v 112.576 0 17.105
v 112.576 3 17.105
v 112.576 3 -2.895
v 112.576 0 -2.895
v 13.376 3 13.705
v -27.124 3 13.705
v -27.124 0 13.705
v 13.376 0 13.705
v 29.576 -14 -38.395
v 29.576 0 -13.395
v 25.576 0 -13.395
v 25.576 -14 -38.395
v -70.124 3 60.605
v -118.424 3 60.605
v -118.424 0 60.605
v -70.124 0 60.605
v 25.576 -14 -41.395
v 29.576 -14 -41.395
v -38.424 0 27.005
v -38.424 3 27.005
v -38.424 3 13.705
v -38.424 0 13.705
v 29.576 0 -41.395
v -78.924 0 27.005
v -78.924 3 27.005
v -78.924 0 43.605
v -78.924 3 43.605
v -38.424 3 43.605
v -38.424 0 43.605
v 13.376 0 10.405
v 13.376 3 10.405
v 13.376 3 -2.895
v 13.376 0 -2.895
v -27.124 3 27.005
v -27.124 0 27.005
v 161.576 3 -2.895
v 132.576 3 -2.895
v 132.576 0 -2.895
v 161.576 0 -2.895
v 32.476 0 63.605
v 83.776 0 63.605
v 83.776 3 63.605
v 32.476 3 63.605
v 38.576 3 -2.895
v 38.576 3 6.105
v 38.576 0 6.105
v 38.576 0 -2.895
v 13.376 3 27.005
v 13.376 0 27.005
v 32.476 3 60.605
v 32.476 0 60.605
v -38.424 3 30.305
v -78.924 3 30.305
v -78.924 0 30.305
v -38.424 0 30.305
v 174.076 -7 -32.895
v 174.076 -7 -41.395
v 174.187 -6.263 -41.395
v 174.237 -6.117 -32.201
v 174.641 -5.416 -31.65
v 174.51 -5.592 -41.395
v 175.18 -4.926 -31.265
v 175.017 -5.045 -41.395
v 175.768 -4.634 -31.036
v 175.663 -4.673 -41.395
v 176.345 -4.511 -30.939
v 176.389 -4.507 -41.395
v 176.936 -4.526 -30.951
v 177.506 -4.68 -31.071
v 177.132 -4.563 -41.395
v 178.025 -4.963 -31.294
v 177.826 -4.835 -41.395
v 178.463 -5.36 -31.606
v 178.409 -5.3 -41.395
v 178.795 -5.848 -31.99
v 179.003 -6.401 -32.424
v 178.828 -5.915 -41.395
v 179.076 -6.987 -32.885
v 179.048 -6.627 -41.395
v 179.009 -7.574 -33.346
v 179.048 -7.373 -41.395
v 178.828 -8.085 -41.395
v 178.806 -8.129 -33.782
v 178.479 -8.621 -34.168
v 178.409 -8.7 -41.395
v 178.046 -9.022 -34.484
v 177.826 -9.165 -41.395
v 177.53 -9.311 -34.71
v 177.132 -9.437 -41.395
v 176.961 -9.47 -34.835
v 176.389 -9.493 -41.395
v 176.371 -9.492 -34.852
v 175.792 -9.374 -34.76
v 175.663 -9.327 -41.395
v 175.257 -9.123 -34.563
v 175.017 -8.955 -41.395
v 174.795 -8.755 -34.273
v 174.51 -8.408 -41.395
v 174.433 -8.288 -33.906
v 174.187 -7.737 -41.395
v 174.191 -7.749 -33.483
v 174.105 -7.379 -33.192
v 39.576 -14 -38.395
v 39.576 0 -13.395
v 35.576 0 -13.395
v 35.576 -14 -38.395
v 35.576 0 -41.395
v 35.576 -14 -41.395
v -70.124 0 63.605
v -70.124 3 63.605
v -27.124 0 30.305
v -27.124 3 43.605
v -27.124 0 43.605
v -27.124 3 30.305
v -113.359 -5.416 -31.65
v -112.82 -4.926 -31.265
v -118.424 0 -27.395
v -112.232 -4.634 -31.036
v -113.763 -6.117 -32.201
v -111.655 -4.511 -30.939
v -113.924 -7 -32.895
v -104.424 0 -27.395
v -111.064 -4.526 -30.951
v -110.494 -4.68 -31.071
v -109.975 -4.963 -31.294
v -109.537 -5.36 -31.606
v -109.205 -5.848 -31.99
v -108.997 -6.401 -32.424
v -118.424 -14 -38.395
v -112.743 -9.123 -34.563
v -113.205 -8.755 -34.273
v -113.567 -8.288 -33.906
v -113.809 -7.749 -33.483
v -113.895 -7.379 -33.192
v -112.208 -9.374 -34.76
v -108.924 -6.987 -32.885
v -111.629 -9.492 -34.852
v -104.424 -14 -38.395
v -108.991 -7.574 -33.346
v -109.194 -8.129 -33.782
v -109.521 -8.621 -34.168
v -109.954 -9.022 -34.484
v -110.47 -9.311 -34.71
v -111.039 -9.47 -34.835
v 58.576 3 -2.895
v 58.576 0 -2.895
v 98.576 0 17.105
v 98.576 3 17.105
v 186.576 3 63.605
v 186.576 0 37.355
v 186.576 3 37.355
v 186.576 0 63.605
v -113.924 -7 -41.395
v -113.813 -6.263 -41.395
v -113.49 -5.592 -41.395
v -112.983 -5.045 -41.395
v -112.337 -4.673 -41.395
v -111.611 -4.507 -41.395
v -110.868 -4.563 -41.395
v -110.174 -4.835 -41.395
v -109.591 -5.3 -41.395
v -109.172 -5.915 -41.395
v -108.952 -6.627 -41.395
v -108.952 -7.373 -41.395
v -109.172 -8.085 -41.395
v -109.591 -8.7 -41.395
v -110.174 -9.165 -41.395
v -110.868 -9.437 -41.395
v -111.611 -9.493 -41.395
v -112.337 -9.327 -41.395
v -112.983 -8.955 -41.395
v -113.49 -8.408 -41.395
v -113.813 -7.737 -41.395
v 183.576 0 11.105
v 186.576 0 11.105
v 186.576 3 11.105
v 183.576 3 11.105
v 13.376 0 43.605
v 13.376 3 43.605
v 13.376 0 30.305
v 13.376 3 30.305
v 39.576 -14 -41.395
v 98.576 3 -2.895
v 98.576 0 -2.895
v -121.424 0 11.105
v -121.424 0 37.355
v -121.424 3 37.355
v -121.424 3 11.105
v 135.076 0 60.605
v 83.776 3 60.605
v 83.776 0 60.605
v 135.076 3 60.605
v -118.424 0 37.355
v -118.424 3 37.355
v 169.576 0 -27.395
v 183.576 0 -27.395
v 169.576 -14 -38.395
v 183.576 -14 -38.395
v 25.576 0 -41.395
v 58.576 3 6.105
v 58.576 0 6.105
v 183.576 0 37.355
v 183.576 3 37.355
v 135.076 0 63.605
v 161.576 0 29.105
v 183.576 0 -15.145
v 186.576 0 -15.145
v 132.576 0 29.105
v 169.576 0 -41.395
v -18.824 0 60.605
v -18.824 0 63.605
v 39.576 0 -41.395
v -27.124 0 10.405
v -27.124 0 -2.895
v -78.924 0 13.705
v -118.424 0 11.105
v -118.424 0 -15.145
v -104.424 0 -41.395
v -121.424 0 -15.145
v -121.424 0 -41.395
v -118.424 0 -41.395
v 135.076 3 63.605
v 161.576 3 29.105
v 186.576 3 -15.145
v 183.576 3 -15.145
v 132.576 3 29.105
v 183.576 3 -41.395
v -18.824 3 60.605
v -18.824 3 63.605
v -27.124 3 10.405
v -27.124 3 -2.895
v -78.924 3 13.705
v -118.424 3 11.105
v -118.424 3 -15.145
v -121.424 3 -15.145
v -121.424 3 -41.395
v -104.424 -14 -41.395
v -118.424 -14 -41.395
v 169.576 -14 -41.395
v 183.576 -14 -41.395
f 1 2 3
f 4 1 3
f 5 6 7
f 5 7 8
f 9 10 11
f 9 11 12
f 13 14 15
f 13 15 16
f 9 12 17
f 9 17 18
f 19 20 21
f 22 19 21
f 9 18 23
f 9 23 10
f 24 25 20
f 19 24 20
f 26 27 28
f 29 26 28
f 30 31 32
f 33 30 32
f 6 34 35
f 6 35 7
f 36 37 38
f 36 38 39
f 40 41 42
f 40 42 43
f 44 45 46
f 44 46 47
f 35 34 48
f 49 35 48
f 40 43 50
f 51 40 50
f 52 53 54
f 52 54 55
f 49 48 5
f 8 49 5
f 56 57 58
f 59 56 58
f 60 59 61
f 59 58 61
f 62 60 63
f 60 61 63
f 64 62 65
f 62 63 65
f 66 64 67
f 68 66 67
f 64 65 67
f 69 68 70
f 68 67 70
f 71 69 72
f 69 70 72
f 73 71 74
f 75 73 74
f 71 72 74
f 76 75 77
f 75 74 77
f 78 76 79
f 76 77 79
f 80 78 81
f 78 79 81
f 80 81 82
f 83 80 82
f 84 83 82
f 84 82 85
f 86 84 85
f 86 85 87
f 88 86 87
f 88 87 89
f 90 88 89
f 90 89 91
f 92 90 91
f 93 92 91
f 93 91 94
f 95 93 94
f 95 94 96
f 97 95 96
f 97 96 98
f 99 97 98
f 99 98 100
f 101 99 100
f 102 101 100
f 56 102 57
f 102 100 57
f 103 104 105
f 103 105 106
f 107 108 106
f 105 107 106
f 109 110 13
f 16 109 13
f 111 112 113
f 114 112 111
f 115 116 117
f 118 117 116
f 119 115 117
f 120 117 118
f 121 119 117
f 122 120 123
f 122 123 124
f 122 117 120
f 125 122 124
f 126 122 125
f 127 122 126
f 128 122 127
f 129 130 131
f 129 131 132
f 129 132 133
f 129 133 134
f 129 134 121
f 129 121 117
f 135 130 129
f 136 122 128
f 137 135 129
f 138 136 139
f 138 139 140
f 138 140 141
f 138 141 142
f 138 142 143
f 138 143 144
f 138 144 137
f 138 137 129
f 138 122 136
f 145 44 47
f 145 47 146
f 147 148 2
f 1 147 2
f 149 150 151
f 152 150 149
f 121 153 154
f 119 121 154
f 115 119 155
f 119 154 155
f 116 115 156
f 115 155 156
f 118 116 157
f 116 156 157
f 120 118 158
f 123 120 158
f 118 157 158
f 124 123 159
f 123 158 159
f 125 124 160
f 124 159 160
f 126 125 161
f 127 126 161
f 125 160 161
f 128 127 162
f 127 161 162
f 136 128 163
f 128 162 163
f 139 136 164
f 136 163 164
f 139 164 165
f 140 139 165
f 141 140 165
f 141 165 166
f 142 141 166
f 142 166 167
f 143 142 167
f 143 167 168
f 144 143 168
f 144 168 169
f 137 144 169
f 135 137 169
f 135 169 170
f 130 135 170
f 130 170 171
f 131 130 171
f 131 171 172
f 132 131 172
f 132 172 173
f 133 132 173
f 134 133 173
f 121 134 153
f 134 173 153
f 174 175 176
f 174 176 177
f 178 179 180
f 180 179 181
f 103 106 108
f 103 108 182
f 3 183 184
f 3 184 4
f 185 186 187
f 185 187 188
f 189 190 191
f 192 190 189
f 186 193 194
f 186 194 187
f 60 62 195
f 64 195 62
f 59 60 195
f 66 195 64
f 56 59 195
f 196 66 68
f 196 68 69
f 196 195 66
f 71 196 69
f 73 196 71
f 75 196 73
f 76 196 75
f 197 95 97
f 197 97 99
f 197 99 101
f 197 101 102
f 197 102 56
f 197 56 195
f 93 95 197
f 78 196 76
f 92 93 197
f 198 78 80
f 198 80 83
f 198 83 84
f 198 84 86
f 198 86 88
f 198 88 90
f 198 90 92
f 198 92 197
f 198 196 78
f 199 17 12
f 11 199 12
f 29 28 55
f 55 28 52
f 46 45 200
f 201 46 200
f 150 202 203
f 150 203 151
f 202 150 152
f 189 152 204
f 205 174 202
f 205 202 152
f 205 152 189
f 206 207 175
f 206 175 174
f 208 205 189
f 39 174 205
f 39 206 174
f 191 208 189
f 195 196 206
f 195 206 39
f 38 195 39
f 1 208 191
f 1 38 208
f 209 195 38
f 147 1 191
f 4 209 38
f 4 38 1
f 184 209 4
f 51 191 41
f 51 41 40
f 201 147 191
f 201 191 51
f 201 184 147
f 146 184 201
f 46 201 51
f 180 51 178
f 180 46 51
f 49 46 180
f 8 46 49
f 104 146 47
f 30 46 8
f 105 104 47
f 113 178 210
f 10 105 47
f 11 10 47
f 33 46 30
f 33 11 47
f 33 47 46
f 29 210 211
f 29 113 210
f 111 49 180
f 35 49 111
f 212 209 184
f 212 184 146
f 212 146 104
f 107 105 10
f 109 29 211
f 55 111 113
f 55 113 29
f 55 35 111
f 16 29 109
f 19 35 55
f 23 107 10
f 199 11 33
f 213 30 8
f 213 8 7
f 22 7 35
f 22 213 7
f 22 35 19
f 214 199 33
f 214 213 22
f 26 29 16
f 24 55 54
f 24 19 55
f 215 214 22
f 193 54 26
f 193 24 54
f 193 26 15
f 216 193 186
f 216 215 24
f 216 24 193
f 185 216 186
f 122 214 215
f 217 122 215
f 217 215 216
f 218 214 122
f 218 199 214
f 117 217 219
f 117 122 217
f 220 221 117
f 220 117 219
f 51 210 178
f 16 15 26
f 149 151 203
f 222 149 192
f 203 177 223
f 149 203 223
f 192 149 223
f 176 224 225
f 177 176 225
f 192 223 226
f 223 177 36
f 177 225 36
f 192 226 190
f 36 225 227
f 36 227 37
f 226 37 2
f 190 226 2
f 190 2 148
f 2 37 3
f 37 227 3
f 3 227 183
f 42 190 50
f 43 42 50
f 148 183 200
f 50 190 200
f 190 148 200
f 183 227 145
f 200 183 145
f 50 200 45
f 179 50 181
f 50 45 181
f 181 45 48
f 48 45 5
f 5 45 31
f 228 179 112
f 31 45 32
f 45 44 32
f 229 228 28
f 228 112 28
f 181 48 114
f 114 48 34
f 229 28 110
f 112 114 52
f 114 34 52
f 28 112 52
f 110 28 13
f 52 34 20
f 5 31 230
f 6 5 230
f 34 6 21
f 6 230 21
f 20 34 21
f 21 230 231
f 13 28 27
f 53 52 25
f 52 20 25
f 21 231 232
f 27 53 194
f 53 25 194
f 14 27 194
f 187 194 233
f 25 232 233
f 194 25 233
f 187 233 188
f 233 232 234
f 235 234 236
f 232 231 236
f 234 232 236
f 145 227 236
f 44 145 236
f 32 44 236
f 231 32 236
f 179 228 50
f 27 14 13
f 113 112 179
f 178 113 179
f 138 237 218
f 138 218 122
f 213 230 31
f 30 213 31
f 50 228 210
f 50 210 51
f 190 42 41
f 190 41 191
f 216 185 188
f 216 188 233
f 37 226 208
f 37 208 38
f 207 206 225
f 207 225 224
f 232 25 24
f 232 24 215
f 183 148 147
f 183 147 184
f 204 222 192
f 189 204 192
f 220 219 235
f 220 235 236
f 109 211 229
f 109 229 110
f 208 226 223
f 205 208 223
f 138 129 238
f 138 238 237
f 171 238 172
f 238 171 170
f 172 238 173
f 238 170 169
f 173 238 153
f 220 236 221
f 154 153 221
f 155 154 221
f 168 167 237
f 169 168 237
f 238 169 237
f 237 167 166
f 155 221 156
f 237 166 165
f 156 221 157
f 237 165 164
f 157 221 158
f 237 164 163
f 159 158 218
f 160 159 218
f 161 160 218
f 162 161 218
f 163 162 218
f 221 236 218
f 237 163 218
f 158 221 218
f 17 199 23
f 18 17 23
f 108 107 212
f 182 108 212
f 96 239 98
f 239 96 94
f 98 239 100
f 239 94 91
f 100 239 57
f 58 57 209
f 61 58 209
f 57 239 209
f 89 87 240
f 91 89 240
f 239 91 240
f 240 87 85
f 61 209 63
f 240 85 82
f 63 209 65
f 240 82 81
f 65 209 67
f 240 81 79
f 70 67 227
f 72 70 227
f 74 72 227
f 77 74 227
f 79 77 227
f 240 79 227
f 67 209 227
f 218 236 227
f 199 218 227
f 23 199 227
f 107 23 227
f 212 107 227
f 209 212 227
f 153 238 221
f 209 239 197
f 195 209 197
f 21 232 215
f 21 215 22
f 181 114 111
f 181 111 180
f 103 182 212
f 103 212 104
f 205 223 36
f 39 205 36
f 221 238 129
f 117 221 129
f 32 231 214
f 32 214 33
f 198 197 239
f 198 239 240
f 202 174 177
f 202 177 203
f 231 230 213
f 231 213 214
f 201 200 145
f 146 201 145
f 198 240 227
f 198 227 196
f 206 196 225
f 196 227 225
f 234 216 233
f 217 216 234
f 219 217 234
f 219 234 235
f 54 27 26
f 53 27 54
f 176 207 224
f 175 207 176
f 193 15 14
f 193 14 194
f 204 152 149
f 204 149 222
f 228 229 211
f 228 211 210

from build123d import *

# Parameters (mm, degrees)
EXTRUDE_1_DEPTH     = 3
SKETCH_2_W          = 40.5
SKETCH_2_H          = 13.3
SKETCH_2_W_2        = 20
SKETCH_2_H_2        = 9
SKETCH_2_W_3        = 14
SKETCH_2_H_3        = 20
SKETCH_2_W_4        = 29
SKETCH_2_H_4        = 32
CUT_EXTRUDE_1_DEPTH = 3
SKETCH_3_W          = 51.3
SKETCH_3_H          = 3
CUT_EXTRUDE_2_DEPTH = 3
SKETCH_4_W          = 4
SKETCH_4_H          = 28
SKETCH_4_W_2        = 14
SKETCH_4_H_2        = 14
EXTRUDE_2_DEPTH     = 14
CUT_EXTRUDE_3_DEPTH = 14
CUT_EXTRUDE_4_DEPTH = 14
CUT_EXTRUDE_5_DEPTH = 14
CUT_EXTRUDE_6_REACH = 216.55
SKETCH_9_R          = 2.5


with BuildPart() as part:
    # Эскиз1 → Бобышка-Вытянуть1 (new body)
    with BuildSketch(Plane(origin=(0, 0, 0), x_dir=(1, 0, 0), z_dir=(0, 1, 0))):
        Polygon((-121.424018304, 15.144551695), (-121.424018304, 41.394551695), (183.575981696, 41.394551695), (183.575981696, 15.144551695), (186.575981696, 15.144551695), (186.575981696, -11.105448305), (183.575981696, -11.105448305), (183.575981696, -37.355448305), (186.575981696, -37.355448305), (186.575981696, -63.605448305), (-118.424018304, -63.605448305), (-118.424018304, -37.355448305), (-121.424018304, -37.355448305), (-121.424018304, -11.105448305), (-118.424018304, -11.105448305), (-118.424018304, 15.144551695), align=None)
    extrude(amount=EXTRUDE_1_DEPTH)

    # Эскиз2 → Вырез-Вытянуть1 (cut)
    with BuildSketch(Plane(origin=(0, 3, 0), x_dir=(1, 0, 0), z_dir=(0, 1, 0))):
        with Locations((-58.674018304, -36.955448305)):
            Rectangle(SKETCH_2_W, SKETCH_2_H)
        with Locations((-6.874018304, -36.955448305)):
            Rectangle(SKETCH_2_W, SKETCH_2_H)
        with Locations((-6.874018304, -20.355448305)):
            Rectangle(SKETCH_2_W, SKETCH_2_H)
        with Locations((-58.674018304, -20.355448305)):
            Rectangle(SKETCH_2_W, SKETCH_2_H)
        with Locations((-6.874018304, -3.755448305)):
            Rectangle(SKETCH_2_W, SKETCH_2_H)
        with Locations((48.575981696, -1.605448305)):
            Rectangle(SKETCH_2_W_2, SKETCH_2_H_2)
        with Locations((105.575981696, -7.105448305)):
            Rectangle(SKETCH_2_W_3, SKETCH_2_H_3)
        with Locations((147.075981696, -13.105448305)):
            Rectangle(SKETCH_2_W_4, SKETCH_2_H_4)
    extrude(amount=-CUT_EXTRUDE_1_DEPTH, mode=Mode.SUBTRACT)

    # Эскиз3 → Вырез-Вытянуть2 (cut)
    with BuildSketch(Plane(origin=(0, 3, 0), x_dir=(1, 0, 0), z_dir=(0, 1, 0))):
        with Locations((-95.774018304, -62.105448305)):
            Rectangle(SKETCH_3_W, SKETCH_3_H)
        with Locations((6.825981696, -62.105448305)):
            Rectangle(SKETCH_3_W, SKETCH_3_H)
        with Locations((109.425981696, -62.105448305)):
            Rectangle(SKETCH_3_W, SKETCH_3_H)
    extrude(amount=-CUT_EXTRUDE_2_DEPTH, mode=Mode.SUBTRACT)

    # Эскиз4 → Бобышка-Вытянуть2 (add)
    with BuildSketch(Plane.XZ):
        with Locations((27.575981696, -27.394551695)):
            Rectangle(SKETCH_4_W, SKETCH_4_H)
        with Locations((-111.424018304, -34.394551695)):
            Rectangle(SKETCH_4_W_2, SKETCH_4_H_2)
        with Locations((176.575981696, -34.394551695)):
            Rectangle(SKETCH_4_W_2, SKETCH_4_H_2)
        with Locations((37.575981696, -27.394551695)):
            Rectangle(SKETCH_4_W, SKETCH_4_H)
    extrude(amount=EXTRUDE_2_DEPTH)

    # Эскиз6 → Вырез-Вытянуть3 (cut)
    with BuildSketch(Plane(origin=(39.575981696, 0, 0), x_dir=(0, 0, -1), z_dir=(1, 0, 0))):
        Polygon((13.394551695, -14), (13.394551695, 0), (38.394551695, -14), align=None)
    extrude(amount=-CUT_EXTRUDE_3_DEPTH, mode=Mode.SUBTRACT)

    # Эскиз7 → Вырез-Вытянуть4 (cut)
    with BuildSketch(Plane(origin=(183.575981696, 0, 0), x_dir=(0, 0, -1), z_dir=(1, 0, 0))):
        Polygon((27.394551695, -14), (27.394551695, 0), (38.394551695, -14), align=None)
    extrude(amount=-CUT_EXTRUDE_4_DEPTH, mode=Mode.SUBTRACT)

    # Эскиз8 → Вырез-Вытянуть5 (cut)
    with BuildSketch(Plane(origin=(-104.424018304, 0, 0), x_dir=(0, 0, -1), z_dir=(1, 0, 0))):
        Polygon((27.394551695, -14), (27.394551695, 0), (38.394551695, -14), align=None)
    extrude(amount=-CUT_EXTRUDE_5_DEPTH, mode=Mode.SUBTRACT)

    # Вырез-Вытянуть6: up to this plane
    cut_extrude_6_end = Plane(origin=(169.575981696, -14, -38.394551695), z_dir=(0, 0.6178215519319037, -0.7863183388224225))
    # Эскиз9 → Вырез-Вытянуть6 (cut, up to the surface)
    with BuildSketch(Plane(origin=(0, 0, -41.394551695), x_dir=(-1, 0, 0), z_dir=(0, 0, -1)), mode=Mode.PRIVATE) as cut_extrude_6_sk1:
        with Locations((-176.575981696, -7)):
            Circle(SKETCH_9_R)
    cut_extrude_6_tool1 = split(extrude(cut_extrude_6_sk1.sketch, amount=-CUT_EXTRUDE_6_REACH, mode=Mode.PRIVATE), bisect_by=cut_extrude_6_end, keep=Keep.BOTH, mode=Mode.PRIVATE)
    add(cut_extrude_6_tool1.solids().sort_by_distance((176.575982, -7, -41.394552))[0], mode=Mode.SUBTRACT)
    # Эскиз9 → Вырез-Вытянуть6 (cut, up to the surface)
    with BuildSketch(Plane(origin=(0, 0, -41.394551695), x_dir=(-1, 0, 0), z_dir=(0, 0, -1)), mode=Mode.PRIVATE) as cut_extrude_6_sk2:
        with Locations((111.424018304, -7)):
            Circle(SKETCH_9_R)
    cut_extrude_6_tool2 = split(extrude(cut_extrude_6_sk2.sketch, amount=-CUT_EXTRUDE_6_REACH, mode=Mode.PRIVATE), bisect_by=cut_extrude_6_end, keep=Keep.BOTH, mode=Mode.PRIVATE)
    add(cut_extrude_6_tool2.solids().sort_by_distance((-111.424018, -7, -41.394552))[0], mode=Mode.SUBTRACT)


solid = part.part
